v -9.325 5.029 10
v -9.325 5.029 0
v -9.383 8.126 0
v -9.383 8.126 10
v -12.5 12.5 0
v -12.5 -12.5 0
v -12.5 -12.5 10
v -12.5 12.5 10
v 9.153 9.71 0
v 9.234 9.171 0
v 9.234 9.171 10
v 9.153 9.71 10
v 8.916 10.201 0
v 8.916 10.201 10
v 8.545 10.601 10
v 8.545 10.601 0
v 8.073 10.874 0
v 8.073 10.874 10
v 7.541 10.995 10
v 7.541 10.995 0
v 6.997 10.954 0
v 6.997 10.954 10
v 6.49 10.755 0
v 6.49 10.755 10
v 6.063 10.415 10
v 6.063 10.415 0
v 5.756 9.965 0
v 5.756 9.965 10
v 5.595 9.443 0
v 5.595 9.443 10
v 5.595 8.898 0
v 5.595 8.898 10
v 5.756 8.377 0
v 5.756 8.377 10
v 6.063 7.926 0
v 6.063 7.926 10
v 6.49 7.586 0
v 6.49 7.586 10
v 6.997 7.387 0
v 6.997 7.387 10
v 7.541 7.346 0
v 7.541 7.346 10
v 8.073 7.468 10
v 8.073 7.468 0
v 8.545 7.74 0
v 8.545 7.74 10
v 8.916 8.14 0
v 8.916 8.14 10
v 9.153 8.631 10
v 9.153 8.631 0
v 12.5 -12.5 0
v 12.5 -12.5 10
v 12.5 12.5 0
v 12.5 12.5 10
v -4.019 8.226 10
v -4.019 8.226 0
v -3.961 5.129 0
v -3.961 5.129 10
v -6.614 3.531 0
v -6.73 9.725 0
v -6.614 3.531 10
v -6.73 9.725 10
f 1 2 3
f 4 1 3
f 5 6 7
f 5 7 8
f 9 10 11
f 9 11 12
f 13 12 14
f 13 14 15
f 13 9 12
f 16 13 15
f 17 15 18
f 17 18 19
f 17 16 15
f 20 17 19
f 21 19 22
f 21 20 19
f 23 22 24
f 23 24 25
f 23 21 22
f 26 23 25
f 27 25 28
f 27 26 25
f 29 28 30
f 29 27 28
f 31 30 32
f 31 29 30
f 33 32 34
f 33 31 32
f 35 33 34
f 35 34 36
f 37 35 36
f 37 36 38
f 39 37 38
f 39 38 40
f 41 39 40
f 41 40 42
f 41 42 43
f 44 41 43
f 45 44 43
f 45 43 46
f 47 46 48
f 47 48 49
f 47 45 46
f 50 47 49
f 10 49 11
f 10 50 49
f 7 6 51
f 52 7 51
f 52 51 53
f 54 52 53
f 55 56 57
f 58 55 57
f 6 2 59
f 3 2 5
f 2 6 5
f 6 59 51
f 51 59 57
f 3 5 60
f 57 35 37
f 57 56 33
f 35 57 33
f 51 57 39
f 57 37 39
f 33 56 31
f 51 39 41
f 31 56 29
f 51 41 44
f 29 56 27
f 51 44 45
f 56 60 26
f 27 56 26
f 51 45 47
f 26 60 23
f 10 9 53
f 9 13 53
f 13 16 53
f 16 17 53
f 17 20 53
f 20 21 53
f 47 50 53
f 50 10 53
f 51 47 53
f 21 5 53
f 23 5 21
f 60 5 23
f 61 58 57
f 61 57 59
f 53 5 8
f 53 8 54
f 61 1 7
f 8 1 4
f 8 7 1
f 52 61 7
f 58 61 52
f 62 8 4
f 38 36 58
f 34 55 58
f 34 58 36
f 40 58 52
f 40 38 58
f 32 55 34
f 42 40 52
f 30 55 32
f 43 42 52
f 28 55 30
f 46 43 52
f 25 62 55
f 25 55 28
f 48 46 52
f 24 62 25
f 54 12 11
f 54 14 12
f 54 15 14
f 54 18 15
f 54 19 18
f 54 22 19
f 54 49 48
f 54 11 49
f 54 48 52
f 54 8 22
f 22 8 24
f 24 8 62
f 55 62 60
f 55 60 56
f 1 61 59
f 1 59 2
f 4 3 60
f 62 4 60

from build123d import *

# Parameters (mm, degrees)
F0_W     = 25
F0_H     = 25
F0_R     = 1.829659
F1_DEPTH = 10


with BuildPart() as f1:
    # F0 (on Top) → F1 (new body)
    with BuildSketch(Plane.XY):
        Rectangle(F0_W, F0_H)
        Polygon((-4.01906, 8.226155), (-3.96133, 5.12945), (-6.61429, 3.531102), (-9.32498, 5.029459), (-9.38271, 8.126164), (-6.72975, 9.724512), align=None, mode=Mode.SUBTRACT)
        with Locations((7.404331, 9.170712)):
            Circle(F0_R, mode=Mode.SUBTRACT)
    extrude(amount=F1_DEPTH)


solid = f1.part
